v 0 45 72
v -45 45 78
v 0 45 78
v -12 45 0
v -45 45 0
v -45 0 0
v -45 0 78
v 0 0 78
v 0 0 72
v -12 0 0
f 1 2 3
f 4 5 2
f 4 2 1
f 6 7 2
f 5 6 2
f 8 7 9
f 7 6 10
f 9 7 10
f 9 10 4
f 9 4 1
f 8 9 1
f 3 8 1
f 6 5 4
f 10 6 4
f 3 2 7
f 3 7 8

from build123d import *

# Parameters (mm, degrees)
SKETCH_W     = 45
SKETCH_H     = 45
PAD_DEPTH    = 78
POCKET_DEPTH = 45.001


with BuildPart() as part:
    # Sketch → Pad (new body)
    with BuildSketch(Plane.XY):
        with Locations((-22.5, 22.5)):
            Rectangle(SKETCH_W, SKETCH_H)
    extrude(amount=PAD_DEPTH)

    # Sketch001 (on Face1 of Pad) → Pocket (cut, through all)
    with BuildSketch(Plane.XZ):
        Polygon((-12, 0), (0, 72), (0, 0), align=None)
    extrude(amount=-POCKET_DEPTH, mode=Mode.SUBTRACT)


solid = part.part
